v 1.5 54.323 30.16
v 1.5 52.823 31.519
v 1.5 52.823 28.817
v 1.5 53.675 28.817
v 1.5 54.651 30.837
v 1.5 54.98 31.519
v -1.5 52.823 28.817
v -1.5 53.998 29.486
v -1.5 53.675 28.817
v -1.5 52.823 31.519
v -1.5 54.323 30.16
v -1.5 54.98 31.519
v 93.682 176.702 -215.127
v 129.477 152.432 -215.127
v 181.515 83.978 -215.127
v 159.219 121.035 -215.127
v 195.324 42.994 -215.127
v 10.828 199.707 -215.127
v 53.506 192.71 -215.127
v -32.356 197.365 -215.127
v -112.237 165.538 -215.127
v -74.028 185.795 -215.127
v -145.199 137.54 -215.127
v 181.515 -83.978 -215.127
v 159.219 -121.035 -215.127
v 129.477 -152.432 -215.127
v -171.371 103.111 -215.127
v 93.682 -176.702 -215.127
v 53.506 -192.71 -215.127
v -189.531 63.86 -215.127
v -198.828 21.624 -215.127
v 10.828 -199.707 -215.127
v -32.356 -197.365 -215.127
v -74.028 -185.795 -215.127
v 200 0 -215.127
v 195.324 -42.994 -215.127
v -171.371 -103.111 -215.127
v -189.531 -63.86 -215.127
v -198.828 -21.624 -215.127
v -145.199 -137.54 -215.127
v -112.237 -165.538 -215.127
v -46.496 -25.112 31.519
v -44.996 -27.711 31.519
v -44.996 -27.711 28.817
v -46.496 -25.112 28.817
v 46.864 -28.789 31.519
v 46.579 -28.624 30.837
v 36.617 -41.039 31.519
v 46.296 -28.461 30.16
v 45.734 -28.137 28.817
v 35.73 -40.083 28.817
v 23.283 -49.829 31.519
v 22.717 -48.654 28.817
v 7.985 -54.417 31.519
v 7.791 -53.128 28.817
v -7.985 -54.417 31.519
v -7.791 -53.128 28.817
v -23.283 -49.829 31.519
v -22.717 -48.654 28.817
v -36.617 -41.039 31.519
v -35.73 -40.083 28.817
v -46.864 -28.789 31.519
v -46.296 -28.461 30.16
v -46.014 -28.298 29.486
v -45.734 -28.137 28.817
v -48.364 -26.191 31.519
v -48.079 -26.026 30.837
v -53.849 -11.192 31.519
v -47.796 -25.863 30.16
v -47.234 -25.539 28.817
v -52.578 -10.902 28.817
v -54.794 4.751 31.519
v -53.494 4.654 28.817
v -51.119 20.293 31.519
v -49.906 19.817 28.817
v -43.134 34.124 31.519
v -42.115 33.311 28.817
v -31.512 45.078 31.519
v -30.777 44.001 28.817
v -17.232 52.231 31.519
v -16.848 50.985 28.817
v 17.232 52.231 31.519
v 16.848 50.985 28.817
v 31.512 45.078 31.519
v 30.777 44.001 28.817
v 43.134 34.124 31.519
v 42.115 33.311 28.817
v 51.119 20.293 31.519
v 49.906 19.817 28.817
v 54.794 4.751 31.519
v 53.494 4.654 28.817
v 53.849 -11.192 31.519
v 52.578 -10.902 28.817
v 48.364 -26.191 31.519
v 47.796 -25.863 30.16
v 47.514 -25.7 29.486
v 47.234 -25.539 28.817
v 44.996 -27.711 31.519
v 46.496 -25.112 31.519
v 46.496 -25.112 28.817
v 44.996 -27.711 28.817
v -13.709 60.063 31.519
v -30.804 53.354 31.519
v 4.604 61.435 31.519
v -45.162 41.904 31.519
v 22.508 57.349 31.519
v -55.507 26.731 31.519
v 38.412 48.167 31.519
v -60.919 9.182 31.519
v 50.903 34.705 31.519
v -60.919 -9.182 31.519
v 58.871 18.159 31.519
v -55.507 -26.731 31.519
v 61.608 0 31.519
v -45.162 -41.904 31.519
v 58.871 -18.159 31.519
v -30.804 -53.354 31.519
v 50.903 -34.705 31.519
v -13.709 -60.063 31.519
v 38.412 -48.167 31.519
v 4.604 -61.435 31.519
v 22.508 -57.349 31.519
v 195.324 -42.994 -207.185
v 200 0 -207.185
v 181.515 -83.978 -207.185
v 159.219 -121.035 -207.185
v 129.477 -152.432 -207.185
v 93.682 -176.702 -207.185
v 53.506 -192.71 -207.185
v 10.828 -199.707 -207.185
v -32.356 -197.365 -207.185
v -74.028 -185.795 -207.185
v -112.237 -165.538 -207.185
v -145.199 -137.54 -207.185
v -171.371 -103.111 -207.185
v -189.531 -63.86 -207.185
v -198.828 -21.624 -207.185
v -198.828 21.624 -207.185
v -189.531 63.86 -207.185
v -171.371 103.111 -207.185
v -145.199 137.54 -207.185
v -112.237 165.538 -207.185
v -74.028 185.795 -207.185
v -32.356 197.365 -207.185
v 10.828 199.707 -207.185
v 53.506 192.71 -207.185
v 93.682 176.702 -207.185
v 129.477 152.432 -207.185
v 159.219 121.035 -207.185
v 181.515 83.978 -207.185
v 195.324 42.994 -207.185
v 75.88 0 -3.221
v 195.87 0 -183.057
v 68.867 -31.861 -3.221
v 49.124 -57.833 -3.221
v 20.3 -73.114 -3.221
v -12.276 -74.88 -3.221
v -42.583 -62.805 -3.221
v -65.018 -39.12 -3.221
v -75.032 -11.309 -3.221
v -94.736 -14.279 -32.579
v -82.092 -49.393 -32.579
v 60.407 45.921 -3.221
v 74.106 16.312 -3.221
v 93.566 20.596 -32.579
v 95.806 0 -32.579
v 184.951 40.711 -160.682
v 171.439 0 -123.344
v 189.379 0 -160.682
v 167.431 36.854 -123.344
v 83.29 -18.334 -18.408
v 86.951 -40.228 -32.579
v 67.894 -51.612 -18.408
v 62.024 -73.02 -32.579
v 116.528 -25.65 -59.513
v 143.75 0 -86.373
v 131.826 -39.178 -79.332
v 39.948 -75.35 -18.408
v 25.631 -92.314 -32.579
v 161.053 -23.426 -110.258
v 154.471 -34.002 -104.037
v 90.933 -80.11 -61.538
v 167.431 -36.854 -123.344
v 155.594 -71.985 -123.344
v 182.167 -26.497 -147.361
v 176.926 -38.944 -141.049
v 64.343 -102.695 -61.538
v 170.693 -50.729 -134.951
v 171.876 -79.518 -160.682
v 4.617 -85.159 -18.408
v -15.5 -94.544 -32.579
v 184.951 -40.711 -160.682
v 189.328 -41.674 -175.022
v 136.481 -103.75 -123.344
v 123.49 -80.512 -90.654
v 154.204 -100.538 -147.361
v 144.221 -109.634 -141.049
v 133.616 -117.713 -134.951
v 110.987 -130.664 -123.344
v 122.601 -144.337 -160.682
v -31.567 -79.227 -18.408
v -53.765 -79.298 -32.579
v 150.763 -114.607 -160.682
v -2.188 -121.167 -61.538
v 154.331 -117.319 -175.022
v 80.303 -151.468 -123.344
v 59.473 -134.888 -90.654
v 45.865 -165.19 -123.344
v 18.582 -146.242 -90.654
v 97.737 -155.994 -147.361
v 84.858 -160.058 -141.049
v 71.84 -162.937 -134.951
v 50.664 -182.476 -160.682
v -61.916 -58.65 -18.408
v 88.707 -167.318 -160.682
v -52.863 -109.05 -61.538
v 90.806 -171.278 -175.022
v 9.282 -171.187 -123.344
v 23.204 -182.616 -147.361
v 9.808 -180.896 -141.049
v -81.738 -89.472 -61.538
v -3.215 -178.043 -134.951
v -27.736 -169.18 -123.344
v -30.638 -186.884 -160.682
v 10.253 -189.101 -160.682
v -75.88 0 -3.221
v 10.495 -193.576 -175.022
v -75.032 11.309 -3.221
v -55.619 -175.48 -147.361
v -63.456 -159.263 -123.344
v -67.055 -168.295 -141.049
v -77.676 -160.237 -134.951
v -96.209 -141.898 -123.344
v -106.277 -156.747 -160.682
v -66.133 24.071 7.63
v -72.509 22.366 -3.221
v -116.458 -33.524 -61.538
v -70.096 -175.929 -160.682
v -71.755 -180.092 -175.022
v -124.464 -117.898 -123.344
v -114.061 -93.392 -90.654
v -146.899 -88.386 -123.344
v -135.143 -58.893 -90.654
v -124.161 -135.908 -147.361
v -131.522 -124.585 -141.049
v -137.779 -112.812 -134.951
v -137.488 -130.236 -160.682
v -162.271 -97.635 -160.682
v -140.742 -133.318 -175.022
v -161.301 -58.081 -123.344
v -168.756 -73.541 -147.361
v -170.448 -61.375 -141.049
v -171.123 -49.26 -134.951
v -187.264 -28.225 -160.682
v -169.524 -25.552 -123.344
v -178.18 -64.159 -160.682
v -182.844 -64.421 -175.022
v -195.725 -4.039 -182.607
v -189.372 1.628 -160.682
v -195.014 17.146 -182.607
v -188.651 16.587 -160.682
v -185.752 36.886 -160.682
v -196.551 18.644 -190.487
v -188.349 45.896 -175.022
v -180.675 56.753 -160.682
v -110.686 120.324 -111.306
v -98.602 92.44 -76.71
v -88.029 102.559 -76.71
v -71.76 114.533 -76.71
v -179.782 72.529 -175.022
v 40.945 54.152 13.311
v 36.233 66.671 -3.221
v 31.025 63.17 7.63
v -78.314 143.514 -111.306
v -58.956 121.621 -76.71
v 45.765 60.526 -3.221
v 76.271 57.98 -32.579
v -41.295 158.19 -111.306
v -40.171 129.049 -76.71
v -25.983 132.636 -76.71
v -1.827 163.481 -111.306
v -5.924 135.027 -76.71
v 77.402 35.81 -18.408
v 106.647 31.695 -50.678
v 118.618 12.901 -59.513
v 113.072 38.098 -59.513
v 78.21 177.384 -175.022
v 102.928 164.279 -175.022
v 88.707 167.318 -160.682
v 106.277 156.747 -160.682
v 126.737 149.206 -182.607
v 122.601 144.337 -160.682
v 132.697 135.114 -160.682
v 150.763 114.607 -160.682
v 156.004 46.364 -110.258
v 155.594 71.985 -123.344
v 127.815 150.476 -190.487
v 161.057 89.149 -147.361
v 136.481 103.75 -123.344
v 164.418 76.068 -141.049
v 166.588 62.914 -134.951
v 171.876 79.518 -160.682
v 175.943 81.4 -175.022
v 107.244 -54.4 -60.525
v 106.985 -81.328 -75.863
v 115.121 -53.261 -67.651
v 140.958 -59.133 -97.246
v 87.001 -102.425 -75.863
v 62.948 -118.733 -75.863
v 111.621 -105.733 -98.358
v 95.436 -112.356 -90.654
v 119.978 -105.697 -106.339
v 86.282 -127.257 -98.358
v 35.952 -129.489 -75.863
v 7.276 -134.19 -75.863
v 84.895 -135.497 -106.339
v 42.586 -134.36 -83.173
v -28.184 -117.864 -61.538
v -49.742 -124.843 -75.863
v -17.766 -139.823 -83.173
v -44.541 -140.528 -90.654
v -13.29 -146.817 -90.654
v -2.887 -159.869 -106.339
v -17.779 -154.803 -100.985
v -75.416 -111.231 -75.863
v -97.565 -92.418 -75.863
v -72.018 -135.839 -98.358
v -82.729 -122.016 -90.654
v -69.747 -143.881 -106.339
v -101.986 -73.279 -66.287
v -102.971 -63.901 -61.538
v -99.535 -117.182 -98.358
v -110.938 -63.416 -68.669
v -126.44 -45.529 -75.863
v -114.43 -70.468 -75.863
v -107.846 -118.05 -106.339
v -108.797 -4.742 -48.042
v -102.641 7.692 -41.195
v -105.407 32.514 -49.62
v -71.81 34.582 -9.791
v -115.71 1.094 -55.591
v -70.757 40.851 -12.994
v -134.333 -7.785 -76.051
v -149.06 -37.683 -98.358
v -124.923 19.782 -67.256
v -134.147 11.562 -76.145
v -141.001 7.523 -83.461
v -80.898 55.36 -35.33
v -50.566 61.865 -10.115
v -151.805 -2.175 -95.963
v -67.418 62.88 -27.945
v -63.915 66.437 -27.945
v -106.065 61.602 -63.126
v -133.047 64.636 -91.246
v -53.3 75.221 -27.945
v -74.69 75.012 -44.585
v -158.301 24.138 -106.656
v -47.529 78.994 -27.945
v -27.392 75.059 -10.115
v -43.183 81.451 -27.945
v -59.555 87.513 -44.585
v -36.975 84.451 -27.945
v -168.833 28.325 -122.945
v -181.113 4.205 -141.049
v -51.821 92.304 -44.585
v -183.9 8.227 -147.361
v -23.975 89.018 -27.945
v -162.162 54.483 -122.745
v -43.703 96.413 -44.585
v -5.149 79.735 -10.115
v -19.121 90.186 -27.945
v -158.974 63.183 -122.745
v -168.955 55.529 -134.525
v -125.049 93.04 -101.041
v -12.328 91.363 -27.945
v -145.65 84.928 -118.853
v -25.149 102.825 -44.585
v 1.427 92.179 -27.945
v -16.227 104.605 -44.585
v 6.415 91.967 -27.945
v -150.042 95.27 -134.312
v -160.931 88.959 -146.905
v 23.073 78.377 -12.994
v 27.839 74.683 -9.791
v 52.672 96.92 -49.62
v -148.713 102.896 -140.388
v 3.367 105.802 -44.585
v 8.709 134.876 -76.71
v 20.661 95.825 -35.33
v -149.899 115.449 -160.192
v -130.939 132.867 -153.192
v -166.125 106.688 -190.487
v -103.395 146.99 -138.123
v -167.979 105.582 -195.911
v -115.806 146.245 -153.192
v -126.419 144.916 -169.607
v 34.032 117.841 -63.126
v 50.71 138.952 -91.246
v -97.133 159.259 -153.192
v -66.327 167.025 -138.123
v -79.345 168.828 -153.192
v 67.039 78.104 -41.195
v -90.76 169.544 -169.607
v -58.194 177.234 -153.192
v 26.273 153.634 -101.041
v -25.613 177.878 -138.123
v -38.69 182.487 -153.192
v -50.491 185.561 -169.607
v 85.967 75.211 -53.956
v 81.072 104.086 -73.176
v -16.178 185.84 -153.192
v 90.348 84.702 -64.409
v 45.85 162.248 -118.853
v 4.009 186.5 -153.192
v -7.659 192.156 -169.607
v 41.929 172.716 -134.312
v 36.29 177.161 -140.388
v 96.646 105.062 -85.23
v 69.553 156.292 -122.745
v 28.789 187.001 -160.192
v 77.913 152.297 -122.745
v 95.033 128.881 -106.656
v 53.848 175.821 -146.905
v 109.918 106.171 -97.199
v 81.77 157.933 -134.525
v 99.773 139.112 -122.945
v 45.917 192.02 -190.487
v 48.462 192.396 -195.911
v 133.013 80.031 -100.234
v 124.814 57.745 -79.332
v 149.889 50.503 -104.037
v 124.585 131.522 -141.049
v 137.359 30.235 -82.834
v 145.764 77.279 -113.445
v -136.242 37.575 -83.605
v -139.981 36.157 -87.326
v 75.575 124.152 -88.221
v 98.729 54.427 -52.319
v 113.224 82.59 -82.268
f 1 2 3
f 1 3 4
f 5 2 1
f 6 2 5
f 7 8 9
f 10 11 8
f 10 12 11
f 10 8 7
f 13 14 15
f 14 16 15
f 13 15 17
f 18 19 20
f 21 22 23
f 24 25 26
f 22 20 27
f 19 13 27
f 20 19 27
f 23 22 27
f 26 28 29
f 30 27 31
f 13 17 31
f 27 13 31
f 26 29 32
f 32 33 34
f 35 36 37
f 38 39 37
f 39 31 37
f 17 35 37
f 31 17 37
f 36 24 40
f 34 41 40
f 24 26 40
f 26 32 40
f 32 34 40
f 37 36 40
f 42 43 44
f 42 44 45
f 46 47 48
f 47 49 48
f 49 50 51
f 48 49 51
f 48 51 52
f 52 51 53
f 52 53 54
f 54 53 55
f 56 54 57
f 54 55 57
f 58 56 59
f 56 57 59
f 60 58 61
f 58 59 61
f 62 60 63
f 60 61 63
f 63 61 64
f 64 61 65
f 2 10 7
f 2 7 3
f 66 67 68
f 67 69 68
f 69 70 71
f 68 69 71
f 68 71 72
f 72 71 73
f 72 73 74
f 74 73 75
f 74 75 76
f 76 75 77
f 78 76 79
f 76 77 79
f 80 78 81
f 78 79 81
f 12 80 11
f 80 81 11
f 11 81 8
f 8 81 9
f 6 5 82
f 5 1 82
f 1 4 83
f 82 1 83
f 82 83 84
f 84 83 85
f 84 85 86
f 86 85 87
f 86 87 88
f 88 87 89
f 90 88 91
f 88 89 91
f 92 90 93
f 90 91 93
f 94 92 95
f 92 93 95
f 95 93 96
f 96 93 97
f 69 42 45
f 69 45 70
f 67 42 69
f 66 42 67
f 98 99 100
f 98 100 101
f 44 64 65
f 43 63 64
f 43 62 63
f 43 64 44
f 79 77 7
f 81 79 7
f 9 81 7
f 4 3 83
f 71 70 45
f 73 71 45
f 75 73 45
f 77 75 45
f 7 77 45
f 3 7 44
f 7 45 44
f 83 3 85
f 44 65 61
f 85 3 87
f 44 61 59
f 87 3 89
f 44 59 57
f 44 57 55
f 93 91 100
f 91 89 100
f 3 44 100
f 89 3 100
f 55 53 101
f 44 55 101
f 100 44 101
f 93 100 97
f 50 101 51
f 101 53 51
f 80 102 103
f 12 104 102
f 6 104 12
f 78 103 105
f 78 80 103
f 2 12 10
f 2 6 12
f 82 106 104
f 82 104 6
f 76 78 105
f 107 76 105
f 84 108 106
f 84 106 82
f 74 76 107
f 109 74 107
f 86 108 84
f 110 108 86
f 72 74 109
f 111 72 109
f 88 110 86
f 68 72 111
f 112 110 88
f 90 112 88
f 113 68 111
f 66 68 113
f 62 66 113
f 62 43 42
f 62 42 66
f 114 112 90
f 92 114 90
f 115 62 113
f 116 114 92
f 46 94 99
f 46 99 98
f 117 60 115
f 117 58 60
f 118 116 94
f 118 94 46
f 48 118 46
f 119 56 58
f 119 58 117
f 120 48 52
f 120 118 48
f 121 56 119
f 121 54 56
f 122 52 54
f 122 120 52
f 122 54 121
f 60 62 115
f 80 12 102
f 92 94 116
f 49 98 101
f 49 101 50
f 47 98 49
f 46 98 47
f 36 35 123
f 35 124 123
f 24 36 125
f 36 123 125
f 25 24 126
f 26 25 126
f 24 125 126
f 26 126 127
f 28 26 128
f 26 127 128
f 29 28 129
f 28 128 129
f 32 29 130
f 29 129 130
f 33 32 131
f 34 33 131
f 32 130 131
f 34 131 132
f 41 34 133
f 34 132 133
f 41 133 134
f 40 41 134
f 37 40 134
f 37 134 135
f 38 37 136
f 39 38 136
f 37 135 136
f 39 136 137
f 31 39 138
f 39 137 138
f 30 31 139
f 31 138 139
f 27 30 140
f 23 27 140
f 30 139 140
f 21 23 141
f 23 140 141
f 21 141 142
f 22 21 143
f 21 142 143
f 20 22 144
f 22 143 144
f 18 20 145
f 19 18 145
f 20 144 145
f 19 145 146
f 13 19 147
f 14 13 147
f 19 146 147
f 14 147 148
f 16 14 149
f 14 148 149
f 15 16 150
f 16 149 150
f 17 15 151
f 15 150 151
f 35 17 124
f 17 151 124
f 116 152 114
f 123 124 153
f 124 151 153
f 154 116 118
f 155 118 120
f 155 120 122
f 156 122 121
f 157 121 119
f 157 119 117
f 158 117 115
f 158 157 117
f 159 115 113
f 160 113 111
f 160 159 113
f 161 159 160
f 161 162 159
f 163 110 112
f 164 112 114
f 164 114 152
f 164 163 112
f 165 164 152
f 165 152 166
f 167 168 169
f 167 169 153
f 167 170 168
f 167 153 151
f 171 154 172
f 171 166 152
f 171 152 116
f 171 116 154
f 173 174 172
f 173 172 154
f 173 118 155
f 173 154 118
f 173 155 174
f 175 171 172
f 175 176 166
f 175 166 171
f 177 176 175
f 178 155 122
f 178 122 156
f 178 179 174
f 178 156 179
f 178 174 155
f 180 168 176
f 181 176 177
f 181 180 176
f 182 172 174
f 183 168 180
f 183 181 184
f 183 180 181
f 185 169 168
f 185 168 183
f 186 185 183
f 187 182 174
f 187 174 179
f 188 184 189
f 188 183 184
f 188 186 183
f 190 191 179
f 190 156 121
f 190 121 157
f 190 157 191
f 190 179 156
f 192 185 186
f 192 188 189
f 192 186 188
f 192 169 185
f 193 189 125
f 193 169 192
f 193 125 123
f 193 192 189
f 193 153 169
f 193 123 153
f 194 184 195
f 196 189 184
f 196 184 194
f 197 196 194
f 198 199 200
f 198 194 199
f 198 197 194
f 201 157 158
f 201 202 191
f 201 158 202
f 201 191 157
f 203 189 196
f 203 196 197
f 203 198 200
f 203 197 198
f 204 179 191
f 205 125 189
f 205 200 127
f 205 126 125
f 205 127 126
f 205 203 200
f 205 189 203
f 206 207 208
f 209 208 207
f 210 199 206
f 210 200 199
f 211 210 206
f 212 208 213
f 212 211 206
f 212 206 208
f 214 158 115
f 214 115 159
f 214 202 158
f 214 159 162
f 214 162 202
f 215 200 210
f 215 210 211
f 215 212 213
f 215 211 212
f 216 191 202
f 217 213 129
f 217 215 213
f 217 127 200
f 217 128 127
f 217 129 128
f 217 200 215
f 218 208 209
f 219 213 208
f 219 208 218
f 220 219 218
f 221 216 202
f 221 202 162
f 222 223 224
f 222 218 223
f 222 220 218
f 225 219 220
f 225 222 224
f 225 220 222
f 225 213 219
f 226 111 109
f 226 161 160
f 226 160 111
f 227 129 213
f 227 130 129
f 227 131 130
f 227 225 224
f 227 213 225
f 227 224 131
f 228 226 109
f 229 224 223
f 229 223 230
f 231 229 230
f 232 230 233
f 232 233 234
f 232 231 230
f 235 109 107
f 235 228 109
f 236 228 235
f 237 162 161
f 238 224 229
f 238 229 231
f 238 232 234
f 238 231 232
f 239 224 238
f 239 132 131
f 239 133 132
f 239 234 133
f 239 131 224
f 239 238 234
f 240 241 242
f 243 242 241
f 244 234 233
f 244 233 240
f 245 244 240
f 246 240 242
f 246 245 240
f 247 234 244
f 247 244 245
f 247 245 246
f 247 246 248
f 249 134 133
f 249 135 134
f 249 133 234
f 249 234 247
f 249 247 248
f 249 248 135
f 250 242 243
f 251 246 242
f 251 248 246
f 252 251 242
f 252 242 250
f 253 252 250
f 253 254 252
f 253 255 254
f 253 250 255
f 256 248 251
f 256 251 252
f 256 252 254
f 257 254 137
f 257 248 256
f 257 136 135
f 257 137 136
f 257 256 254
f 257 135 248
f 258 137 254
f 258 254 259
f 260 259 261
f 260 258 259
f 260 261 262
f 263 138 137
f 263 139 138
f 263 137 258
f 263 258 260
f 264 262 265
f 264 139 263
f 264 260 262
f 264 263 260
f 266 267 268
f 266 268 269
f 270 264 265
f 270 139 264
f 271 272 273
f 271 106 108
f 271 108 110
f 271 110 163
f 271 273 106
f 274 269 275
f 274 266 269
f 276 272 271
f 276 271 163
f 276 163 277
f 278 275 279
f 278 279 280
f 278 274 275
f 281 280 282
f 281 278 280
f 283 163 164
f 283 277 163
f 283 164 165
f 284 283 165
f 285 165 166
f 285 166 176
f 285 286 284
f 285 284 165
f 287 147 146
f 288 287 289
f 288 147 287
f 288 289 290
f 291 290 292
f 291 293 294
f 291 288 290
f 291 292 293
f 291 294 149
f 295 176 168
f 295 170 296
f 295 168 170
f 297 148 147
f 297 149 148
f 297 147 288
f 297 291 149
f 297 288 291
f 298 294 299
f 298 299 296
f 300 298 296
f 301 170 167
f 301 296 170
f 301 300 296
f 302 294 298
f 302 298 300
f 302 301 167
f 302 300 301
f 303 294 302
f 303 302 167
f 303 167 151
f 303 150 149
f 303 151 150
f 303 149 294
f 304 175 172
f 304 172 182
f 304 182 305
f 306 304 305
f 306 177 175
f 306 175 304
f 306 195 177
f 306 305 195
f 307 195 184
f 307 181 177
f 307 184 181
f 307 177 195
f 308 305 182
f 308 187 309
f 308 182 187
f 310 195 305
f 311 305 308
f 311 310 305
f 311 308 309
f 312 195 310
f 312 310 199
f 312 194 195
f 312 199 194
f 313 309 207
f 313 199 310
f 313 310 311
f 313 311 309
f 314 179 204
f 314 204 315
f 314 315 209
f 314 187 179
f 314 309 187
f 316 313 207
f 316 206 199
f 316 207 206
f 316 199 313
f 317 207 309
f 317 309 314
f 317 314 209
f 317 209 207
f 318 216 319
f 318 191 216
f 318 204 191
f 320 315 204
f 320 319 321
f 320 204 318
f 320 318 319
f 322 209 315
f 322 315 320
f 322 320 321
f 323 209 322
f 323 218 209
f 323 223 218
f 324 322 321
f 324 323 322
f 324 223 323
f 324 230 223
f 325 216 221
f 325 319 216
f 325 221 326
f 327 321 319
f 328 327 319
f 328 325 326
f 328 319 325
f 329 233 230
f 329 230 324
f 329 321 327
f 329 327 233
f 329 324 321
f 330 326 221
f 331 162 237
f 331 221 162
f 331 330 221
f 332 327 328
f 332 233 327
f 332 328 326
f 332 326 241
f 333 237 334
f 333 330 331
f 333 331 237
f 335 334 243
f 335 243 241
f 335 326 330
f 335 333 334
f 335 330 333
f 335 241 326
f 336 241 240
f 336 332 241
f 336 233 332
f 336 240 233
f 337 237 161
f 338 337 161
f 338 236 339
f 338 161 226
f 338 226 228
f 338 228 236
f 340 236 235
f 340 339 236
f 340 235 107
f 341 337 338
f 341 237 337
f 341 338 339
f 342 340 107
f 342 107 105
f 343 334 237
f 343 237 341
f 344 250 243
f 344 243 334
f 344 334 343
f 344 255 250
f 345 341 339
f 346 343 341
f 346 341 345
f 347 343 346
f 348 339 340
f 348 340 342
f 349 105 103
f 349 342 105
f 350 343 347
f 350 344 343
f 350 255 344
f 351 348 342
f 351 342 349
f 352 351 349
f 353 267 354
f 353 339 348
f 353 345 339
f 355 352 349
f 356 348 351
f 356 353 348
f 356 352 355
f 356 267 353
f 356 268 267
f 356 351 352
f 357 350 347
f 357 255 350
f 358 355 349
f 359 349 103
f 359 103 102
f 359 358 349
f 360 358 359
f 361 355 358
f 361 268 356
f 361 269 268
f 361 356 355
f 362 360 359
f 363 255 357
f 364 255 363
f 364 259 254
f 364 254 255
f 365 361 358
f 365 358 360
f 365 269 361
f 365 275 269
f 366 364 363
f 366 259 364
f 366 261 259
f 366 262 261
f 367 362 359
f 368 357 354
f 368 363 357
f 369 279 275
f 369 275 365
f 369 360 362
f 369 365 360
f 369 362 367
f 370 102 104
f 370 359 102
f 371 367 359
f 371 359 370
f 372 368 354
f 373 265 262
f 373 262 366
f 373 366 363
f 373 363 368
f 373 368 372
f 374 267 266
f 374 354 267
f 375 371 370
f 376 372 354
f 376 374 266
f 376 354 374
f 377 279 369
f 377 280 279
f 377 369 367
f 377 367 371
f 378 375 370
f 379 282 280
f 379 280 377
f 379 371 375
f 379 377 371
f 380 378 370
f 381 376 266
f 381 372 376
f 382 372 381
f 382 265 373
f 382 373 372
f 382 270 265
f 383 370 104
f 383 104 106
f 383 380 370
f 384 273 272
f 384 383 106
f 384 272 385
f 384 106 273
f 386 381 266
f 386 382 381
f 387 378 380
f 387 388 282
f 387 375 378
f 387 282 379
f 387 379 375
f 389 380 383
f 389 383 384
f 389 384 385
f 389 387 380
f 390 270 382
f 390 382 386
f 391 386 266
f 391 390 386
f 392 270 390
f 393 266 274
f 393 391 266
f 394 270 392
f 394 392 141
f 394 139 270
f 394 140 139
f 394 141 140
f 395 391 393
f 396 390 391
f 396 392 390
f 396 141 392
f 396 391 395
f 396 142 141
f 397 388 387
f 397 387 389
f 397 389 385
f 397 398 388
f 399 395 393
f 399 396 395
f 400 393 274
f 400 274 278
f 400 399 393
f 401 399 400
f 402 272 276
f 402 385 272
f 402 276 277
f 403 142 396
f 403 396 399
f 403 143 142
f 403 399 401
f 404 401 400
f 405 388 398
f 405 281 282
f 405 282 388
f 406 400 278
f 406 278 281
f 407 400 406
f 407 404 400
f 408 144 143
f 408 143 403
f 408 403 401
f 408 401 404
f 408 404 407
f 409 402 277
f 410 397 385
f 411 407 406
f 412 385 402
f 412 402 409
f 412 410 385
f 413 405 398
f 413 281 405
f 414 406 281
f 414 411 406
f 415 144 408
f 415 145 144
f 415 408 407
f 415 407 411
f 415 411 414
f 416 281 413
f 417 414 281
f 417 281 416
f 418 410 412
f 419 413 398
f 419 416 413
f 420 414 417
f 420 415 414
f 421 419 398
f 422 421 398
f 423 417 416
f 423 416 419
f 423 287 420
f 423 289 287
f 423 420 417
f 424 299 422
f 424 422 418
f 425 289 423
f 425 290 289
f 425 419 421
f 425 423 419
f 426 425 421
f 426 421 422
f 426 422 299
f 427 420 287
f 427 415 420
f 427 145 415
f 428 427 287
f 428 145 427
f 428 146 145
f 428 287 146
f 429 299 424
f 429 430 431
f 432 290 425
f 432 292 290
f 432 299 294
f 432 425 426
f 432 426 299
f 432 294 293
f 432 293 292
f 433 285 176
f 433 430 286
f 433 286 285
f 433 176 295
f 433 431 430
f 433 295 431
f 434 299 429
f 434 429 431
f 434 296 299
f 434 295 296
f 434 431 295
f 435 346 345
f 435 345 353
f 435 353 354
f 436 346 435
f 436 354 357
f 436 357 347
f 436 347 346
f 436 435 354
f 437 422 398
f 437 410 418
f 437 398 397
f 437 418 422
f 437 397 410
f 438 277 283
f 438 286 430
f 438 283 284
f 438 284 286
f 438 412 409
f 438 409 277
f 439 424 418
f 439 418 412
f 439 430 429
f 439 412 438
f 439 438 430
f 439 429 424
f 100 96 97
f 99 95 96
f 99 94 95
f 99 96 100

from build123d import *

# Parameters (mm, degrees)
F4_DEPTH        = 2.7018745767
F4_COPIES_COUNT = 3


# Not quite as in the source:
# - a pattern or mirror of a feature is missing from the dataset's text; its kind, count and spacing are read off the source's solid


with BuildPart() as f2:
    # F0 (on Front) → F2 (revolve)
    with BuildSketch(Plane.XZ):
        with BuildLine():
            Line((53.6962079262, 28.8167757166), (0, 28.8167757166))
            Line((0, 28.8167757166), (0, -215.1266485453))
            Line((0, -215.1266485453), (200, -215.1266485453))
            Line((200, -215.1266485453), (200, -212.5729433804))
            Line((200, -212.5729433804), (200, -207.1854621172))
            add(Edge.make_bspline(
                [(61.6075841476, 31.5186502934), (87.6578390598, -62.1243081987), (185.5585724115, -83.8800296187), (200, -207.1854621172)],
                knots=[0, 0, 0, 0, 275.9204850082, 275.9204850082, 275.9204850082, 275.9204850082], degree=3))
            Line((61.6075841476, 31.5186502934), (59, 31.5186502934))
            Line((59, 31.5186502934), (57, 31.5186502934))
            Line((57, 31.5186502934), (55, 31.5186502934))
            Line((55, 31.5186502934), (53.6962079262, 28.8167757166))
        make_face()
    revolve(axis=Axis((0, 0, -61.6418045454), (0, 0, -1)))

    # F3 (on face) → F4 (join, through all)
    with BuildSketch(Plane.XY.offset(31.5186502934)):
        Polygon((-1.5, 52.8230071068), (0, 52.8230071068), (1.5, 52.8230071068), (1.5, 55.3230071068), (0, 55.3230071068), (-1.5, 55.3230071068), align=None)
    f4 = extrude(amount=-F4_DEPTH)

    # F4_copies: F4 ×3 about axis
    f4_copies_axis = Axis((0, 0, 0), (0, 0, 1))
    for i in range(1, F4_COPIES_COUNT):
        add(f4.rotate(f4_copies_axis, i * 360 / F4_COPIES_COUNT))


solid = f2.part
